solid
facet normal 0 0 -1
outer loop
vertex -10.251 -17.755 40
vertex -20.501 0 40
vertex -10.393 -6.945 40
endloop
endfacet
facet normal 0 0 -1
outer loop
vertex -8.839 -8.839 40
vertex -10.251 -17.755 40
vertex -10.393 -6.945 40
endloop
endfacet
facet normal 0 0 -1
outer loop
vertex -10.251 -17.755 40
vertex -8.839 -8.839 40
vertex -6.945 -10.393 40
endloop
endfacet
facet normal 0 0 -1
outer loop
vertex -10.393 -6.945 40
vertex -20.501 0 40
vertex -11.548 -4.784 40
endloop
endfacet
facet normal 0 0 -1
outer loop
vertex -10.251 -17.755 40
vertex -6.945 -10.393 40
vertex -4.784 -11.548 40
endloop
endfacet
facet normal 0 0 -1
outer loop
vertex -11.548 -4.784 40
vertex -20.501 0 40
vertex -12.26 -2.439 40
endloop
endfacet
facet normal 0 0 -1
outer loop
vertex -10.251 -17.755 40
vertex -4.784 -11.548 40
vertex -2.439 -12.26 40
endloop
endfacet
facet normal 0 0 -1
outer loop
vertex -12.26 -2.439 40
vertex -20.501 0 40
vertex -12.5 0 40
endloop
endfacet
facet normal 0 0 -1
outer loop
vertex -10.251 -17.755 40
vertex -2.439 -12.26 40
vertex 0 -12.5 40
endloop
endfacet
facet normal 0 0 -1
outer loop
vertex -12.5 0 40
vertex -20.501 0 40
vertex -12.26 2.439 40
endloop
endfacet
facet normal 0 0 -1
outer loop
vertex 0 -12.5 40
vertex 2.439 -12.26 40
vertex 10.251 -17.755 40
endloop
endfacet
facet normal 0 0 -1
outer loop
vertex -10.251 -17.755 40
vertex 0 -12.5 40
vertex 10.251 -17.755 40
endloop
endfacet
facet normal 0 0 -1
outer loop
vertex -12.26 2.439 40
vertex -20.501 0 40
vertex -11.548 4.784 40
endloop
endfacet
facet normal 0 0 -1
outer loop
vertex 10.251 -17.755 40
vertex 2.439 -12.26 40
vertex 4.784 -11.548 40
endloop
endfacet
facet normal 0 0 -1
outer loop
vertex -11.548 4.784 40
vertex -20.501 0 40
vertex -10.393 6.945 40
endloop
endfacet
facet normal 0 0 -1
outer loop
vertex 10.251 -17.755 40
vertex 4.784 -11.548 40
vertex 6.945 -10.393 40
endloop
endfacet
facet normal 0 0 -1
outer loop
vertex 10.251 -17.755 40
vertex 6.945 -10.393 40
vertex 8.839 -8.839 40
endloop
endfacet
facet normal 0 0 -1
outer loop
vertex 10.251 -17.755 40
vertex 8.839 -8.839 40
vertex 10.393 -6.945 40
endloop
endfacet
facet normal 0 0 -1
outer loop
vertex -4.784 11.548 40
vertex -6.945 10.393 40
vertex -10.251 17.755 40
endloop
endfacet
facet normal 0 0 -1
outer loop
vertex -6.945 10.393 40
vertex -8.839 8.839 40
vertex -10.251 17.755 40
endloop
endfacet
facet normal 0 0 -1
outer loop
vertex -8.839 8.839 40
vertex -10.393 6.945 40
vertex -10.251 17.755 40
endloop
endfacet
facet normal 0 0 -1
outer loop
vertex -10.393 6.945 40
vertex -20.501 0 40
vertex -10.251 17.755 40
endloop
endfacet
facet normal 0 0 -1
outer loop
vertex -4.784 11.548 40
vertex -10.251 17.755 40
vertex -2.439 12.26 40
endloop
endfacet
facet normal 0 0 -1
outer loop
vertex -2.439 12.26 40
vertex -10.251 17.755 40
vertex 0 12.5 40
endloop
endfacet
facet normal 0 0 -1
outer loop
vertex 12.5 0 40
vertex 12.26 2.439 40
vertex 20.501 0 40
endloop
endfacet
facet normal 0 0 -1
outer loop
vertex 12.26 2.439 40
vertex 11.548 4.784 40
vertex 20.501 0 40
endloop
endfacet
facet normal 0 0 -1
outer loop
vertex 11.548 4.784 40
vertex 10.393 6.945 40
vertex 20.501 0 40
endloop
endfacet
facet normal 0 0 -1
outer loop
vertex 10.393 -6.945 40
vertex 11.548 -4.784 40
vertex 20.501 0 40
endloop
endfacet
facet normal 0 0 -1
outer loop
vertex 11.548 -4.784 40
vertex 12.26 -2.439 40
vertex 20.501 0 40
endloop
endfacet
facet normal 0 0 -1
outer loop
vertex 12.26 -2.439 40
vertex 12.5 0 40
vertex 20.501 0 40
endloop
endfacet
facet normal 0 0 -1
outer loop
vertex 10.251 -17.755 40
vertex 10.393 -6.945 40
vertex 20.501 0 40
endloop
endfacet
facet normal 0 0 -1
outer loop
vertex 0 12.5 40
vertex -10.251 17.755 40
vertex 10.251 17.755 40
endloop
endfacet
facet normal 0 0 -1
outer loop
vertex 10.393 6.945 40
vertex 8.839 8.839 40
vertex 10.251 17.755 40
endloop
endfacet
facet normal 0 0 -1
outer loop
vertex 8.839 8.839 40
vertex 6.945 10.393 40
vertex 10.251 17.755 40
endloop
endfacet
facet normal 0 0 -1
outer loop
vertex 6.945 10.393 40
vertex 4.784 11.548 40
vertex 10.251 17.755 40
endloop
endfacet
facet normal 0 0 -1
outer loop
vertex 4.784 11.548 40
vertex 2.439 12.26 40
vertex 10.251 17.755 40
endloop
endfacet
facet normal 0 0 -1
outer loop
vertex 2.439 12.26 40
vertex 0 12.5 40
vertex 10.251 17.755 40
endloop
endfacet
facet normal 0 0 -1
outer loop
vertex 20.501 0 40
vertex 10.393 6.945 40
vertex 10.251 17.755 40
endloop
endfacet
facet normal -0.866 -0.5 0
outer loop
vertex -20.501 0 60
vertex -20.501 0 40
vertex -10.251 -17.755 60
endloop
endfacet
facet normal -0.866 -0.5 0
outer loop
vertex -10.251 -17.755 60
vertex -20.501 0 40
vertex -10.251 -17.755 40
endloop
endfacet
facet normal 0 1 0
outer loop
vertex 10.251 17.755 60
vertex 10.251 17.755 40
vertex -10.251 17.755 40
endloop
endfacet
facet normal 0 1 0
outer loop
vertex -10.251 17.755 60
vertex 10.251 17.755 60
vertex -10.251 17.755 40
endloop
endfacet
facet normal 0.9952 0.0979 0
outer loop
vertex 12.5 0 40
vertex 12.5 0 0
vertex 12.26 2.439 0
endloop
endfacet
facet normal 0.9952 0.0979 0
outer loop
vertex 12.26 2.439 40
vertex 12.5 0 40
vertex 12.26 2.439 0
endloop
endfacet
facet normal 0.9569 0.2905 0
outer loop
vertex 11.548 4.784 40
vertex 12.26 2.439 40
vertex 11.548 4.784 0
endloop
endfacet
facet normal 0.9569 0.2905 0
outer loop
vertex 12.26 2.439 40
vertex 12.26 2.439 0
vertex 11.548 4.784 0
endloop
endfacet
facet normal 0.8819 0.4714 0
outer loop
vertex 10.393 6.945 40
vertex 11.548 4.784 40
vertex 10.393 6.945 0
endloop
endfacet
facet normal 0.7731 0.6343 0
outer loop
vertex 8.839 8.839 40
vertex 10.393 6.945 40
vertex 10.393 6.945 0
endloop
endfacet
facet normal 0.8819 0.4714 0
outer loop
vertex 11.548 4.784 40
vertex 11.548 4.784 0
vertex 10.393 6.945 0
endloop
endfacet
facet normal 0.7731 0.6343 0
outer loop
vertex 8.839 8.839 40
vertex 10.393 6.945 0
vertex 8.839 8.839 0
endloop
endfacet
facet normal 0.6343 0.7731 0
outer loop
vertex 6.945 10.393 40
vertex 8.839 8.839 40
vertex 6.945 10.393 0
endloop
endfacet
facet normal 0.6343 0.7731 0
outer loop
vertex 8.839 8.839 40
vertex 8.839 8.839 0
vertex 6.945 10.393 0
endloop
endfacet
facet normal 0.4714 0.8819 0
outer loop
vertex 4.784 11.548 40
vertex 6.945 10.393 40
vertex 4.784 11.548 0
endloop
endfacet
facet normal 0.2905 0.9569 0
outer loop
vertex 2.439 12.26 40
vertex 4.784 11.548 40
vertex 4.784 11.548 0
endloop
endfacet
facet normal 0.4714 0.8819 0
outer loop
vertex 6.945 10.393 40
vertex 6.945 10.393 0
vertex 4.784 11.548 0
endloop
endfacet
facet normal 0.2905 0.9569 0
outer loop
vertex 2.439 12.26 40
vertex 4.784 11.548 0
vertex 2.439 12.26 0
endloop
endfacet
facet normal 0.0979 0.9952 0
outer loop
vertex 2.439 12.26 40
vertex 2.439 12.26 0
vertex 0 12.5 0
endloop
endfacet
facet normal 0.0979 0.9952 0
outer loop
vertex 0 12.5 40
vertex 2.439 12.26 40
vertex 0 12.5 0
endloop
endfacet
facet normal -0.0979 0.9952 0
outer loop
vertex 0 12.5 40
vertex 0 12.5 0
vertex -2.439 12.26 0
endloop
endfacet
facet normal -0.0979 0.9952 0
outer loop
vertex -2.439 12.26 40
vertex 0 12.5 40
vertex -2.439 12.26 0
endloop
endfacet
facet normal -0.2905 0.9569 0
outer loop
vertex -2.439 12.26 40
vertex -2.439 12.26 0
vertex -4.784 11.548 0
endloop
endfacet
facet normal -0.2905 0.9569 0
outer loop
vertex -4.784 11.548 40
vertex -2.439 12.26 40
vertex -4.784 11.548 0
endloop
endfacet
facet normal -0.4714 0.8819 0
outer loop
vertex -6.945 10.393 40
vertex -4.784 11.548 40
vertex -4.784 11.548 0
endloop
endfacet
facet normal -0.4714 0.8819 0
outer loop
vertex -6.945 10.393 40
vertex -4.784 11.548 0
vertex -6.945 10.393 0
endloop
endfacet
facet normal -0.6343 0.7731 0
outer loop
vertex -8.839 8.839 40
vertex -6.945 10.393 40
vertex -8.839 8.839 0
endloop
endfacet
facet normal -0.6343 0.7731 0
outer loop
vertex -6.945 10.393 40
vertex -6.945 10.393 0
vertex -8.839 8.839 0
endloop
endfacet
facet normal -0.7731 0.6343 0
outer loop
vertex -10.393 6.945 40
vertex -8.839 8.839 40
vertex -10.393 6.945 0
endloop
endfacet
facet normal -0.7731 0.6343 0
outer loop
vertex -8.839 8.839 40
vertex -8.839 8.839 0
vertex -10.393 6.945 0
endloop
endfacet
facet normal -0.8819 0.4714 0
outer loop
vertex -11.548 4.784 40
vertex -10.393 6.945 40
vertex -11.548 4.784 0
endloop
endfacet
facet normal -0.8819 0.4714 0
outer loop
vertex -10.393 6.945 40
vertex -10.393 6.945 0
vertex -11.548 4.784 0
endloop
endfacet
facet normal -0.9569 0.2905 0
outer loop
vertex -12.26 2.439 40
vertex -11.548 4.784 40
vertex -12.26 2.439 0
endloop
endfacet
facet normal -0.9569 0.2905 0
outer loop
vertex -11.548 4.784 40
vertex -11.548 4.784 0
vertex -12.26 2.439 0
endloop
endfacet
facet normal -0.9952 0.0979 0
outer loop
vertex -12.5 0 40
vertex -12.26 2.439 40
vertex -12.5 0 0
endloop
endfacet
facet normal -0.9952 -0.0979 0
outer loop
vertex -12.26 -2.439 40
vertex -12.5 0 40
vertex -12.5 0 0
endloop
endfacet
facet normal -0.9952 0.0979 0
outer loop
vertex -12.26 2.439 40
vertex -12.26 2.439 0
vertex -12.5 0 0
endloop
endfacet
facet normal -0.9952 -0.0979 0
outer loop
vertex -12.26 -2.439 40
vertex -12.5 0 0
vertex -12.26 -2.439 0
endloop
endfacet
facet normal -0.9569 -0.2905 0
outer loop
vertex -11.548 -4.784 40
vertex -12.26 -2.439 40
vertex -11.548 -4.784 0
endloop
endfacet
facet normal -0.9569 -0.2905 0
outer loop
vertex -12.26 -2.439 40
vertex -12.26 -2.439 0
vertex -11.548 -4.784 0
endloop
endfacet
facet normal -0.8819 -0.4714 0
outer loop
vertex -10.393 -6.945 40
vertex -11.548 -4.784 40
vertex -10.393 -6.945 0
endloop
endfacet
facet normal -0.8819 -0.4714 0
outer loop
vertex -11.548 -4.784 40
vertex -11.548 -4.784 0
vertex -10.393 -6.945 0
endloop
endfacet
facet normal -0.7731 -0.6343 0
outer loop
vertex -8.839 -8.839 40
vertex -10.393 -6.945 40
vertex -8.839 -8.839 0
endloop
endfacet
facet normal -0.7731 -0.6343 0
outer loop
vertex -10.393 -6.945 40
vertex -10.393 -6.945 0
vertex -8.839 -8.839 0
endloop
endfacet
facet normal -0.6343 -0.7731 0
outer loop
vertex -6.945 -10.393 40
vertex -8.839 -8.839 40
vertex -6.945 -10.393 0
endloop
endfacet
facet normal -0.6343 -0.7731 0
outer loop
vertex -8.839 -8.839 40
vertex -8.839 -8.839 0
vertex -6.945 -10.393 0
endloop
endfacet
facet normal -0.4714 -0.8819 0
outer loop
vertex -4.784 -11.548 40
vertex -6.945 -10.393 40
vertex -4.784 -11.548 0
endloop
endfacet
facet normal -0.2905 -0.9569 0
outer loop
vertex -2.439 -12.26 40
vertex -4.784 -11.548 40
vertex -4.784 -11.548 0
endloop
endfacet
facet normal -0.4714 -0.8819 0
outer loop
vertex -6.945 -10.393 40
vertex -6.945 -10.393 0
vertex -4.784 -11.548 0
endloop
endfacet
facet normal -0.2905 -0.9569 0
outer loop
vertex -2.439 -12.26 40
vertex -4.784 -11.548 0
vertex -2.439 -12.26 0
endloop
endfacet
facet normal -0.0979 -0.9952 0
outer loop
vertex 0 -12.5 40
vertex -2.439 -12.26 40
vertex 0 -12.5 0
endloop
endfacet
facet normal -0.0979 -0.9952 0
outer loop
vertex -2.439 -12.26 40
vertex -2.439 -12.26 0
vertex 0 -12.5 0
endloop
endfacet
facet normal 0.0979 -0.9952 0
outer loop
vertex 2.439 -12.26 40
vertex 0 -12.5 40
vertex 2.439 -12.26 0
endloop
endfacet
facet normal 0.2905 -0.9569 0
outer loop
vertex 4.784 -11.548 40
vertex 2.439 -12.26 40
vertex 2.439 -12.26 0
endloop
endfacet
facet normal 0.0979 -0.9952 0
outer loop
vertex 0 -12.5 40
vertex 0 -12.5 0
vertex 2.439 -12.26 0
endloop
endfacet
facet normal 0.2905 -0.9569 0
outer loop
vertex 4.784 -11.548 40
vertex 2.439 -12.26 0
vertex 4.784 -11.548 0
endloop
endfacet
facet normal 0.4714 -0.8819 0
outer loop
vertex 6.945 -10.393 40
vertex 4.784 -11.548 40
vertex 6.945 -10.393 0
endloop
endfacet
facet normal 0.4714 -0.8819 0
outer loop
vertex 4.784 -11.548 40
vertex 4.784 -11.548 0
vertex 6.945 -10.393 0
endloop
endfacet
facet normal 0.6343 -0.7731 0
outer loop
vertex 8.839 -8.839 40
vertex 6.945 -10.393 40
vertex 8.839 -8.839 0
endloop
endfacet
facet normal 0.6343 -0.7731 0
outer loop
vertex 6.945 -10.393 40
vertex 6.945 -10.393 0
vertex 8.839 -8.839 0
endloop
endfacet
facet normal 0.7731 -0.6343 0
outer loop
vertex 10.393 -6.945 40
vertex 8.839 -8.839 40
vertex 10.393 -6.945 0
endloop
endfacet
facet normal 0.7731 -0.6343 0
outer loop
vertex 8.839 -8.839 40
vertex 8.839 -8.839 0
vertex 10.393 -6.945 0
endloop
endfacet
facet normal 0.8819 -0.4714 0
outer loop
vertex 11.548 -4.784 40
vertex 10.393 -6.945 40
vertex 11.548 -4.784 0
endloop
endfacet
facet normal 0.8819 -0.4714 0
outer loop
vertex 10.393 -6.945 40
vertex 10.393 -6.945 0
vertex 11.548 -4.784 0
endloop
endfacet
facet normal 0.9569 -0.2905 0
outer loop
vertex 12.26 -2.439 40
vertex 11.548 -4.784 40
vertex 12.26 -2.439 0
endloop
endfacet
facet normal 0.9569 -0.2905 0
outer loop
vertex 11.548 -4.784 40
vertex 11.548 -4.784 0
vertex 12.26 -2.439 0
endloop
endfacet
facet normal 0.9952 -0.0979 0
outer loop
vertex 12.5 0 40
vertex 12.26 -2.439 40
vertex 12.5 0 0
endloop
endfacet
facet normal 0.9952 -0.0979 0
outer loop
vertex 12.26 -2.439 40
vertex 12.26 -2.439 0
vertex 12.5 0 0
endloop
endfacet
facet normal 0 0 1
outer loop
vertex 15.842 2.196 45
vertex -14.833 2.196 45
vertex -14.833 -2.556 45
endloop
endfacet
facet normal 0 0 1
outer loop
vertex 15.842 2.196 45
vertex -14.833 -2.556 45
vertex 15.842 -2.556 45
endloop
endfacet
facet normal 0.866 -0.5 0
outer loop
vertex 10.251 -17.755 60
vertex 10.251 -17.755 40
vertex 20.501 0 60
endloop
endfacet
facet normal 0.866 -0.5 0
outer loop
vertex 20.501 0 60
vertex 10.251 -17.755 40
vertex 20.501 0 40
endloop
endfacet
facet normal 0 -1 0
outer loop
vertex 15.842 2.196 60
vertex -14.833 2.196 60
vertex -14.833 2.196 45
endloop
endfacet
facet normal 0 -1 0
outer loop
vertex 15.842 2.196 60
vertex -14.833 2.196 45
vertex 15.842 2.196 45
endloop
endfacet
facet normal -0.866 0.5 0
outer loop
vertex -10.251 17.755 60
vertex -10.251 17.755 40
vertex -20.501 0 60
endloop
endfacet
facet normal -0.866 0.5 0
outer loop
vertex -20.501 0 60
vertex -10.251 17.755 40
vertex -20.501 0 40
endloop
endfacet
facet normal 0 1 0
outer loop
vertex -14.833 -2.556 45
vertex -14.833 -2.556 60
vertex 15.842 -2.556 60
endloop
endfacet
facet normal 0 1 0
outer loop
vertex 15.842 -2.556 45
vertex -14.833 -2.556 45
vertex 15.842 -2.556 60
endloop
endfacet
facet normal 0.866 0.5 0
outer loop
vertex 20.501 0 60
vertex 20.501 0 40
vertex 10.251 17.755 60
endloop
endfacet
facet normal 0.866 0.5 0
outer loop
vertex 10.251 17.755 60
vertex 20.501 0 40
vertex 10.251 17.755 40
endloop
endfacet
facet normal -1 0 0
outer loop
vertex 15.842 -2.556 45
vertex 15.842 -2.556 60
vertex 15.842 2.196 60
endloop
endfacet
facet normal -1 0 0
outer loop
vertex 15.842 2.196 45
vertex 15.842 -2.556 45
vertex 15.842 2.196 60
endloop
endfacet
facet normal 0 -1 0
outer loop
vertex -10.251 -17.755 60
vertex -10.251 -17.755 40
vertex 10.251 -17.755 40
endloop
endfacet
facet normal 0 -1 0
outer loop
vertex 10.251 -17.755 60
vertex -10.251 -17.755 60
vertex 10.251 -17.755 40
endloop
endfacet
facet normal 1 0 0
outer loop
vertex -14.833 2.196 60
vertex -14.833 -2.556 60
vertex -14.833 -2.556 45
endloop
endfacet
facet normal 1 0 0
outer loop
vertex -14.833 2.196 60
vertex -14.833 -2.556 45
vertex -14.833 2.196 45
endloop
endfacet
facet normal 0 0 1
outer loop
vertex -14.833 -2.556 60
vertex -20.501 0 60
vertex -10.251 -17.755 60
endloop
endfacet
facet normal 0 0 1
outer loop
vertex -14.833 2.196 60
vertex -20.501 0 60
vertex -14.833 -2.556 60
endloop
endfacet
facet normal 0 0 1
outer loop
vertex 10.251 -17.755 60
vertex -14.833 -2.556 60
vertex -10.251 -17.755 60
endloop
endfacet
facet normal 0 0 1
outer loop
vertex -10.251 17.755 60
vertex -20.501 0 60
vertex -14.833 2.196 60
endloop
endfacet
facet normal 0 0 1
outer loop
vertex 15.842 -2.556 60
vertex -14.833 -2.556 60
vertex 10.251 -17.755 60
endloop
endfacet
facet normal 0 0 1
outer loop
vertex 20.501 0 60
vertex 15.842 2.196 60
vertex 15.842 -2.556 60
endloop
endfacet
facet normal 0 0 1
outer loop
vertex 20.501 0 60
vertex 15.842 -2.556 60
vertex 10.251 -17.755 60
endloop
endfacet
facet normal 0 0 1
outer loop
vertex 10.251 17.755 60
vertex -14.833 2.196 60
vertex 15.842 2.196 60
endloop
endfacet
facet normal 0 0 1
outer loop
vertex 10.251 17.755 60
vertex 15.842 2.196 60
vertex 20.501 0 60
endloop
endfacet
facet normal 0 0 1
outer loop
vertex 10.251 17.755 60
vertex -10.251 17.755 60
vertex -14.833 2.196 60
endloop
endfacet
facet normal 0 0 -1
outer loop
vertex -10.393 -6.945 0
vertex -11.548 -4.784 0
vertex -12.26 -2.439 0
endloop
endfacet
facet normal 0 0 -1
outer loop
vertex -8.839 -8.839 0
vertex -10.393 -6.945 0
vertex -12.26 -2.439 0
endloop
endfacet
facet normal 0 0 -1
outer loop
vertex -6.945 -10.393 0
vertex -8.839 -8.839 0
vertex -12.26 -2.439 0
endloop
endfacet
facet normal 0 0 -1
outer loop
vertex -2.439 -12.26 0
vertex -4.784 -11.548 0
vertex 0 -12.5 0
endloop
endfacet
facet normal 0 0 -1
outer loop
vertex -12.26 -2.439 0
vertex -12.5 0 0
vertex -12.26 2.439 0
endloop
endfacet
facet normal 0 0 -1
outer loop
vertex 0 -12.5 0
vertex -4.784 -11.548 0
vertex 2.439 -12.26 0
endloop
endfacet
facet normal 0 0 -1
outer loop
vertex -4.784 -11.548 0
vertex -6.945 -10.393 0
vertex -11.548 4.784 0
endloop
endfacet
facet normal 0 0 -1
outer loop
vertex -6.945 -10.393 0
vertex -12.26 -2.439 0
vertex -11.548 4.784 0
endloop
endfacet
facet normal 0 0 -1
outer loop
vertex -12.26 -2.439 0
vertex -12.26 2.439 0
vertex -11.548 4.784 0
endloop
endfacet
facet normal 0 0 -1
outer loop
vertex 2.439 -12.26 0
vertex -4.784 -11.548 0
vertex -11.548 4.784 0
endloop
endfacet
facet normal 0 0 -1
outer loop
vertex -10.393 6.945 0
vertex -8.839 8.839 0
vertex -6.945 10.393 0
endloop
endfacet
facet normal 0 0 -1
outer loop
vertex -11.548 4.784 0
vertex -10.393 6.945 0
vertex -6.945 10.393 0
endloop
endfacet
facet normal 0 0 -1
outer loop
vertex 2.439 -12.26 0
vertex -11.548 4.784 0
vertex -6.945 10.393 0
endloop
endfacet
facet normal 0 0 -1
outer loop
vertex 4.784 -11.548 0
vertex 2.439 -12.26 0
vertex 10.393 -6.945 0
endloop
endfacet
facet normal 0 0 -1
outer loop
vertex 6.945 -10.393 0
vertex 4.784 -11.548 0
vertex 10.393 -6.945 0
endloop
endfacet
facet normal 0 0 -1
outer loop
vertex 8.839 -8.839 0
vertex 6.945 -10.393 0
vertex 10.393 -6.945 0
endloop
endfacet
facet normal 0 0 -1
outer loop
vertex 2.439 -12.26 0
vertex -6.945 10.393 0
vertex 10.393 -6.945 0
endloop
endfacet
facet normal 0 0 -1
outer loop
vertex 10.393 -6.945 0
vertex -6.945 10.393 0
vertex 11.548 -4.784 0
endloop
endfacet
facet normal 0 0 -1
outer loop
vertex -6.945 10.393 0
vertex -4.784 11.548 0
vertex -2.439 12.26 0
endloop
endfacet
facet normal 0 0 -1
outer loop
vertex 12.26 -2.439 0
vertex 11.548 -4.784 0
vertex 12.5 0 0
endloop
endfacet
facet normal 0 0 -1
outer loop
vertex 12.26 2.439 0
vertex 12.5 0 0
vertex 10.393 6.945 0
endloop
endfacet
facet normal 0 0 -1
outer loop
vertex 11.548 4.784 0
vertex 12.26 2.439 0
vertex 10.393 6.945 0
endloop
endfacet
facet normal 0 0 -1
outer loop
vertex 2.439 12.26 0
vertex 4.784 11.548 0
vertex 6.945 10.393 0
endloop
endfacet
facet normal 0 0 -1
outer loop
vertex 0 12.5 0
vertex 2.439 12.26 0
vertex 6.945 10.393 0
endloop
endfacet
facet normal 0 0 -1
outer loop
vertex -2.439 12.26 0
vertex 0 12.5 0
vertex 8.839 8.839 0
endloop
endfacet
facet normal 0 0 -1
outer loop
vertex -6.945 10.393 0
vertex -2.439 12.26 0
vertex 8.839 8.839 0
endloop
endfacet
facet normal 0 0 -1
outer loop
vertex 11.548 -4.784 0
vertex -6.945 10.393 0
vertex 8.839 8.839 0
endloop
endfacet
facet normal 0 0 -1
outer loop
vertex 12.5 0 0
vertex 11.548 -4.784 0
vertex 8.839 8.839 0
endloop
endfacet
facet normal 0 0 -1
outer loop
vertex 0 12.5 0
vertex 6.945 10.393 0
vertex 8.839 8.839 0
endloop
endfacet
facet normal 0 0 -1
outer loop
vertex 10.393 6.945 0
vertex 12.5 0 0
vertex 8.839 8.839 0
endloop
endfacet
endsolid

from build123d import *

# Parameters (mm, degrees)
SKETCH1_R           = 12.5
BOSS_EXTRUDE1_DEPTH = 40
BOSS_EXTRUDE2_DEPTH = 20
SKETCH3_W           = 30.675059353
SKETCH3_H           = 4.752473984
CUT_EXTRUDE1_DEPTH  = 15


with BuildPart() as part:
    # Sketch1 → Boss-Extrude1 (new body)
    with BuildSketch(Plane.XY):
        Circle(SKETCH1_R)
    extrude(amount=BOSS_EXTRUDE1_DEPTH)

    # Sketch2 → Boss-Extrude2 (add)
    with BuildSketch(Plane.XY.offset(40)):
        Polygon((20.501198272, 0), (10.250599136, 17.754558511), (-10.250599136, 17.754558511), (-20.501198272, 0), (-10.250599136, -17.754558511), (10.250599136, -17.754558511), align=None)
    extrude(amount=BOSS_EXTRUDE2_DEPTH)

    # Sketch3 → Cut-Extrude1 (cut)
    with BuildSketch(Plane.XY.offset(60)):
        with Locations((0.504050272, -0.180017954)):
            Rectangle(SKETCH3_W, SKETCH3_H)
    extrude(amount=-CUT_EXTRUDE1_DEPTH, mode=Mode.SUBTRACT)


solid = part.part
